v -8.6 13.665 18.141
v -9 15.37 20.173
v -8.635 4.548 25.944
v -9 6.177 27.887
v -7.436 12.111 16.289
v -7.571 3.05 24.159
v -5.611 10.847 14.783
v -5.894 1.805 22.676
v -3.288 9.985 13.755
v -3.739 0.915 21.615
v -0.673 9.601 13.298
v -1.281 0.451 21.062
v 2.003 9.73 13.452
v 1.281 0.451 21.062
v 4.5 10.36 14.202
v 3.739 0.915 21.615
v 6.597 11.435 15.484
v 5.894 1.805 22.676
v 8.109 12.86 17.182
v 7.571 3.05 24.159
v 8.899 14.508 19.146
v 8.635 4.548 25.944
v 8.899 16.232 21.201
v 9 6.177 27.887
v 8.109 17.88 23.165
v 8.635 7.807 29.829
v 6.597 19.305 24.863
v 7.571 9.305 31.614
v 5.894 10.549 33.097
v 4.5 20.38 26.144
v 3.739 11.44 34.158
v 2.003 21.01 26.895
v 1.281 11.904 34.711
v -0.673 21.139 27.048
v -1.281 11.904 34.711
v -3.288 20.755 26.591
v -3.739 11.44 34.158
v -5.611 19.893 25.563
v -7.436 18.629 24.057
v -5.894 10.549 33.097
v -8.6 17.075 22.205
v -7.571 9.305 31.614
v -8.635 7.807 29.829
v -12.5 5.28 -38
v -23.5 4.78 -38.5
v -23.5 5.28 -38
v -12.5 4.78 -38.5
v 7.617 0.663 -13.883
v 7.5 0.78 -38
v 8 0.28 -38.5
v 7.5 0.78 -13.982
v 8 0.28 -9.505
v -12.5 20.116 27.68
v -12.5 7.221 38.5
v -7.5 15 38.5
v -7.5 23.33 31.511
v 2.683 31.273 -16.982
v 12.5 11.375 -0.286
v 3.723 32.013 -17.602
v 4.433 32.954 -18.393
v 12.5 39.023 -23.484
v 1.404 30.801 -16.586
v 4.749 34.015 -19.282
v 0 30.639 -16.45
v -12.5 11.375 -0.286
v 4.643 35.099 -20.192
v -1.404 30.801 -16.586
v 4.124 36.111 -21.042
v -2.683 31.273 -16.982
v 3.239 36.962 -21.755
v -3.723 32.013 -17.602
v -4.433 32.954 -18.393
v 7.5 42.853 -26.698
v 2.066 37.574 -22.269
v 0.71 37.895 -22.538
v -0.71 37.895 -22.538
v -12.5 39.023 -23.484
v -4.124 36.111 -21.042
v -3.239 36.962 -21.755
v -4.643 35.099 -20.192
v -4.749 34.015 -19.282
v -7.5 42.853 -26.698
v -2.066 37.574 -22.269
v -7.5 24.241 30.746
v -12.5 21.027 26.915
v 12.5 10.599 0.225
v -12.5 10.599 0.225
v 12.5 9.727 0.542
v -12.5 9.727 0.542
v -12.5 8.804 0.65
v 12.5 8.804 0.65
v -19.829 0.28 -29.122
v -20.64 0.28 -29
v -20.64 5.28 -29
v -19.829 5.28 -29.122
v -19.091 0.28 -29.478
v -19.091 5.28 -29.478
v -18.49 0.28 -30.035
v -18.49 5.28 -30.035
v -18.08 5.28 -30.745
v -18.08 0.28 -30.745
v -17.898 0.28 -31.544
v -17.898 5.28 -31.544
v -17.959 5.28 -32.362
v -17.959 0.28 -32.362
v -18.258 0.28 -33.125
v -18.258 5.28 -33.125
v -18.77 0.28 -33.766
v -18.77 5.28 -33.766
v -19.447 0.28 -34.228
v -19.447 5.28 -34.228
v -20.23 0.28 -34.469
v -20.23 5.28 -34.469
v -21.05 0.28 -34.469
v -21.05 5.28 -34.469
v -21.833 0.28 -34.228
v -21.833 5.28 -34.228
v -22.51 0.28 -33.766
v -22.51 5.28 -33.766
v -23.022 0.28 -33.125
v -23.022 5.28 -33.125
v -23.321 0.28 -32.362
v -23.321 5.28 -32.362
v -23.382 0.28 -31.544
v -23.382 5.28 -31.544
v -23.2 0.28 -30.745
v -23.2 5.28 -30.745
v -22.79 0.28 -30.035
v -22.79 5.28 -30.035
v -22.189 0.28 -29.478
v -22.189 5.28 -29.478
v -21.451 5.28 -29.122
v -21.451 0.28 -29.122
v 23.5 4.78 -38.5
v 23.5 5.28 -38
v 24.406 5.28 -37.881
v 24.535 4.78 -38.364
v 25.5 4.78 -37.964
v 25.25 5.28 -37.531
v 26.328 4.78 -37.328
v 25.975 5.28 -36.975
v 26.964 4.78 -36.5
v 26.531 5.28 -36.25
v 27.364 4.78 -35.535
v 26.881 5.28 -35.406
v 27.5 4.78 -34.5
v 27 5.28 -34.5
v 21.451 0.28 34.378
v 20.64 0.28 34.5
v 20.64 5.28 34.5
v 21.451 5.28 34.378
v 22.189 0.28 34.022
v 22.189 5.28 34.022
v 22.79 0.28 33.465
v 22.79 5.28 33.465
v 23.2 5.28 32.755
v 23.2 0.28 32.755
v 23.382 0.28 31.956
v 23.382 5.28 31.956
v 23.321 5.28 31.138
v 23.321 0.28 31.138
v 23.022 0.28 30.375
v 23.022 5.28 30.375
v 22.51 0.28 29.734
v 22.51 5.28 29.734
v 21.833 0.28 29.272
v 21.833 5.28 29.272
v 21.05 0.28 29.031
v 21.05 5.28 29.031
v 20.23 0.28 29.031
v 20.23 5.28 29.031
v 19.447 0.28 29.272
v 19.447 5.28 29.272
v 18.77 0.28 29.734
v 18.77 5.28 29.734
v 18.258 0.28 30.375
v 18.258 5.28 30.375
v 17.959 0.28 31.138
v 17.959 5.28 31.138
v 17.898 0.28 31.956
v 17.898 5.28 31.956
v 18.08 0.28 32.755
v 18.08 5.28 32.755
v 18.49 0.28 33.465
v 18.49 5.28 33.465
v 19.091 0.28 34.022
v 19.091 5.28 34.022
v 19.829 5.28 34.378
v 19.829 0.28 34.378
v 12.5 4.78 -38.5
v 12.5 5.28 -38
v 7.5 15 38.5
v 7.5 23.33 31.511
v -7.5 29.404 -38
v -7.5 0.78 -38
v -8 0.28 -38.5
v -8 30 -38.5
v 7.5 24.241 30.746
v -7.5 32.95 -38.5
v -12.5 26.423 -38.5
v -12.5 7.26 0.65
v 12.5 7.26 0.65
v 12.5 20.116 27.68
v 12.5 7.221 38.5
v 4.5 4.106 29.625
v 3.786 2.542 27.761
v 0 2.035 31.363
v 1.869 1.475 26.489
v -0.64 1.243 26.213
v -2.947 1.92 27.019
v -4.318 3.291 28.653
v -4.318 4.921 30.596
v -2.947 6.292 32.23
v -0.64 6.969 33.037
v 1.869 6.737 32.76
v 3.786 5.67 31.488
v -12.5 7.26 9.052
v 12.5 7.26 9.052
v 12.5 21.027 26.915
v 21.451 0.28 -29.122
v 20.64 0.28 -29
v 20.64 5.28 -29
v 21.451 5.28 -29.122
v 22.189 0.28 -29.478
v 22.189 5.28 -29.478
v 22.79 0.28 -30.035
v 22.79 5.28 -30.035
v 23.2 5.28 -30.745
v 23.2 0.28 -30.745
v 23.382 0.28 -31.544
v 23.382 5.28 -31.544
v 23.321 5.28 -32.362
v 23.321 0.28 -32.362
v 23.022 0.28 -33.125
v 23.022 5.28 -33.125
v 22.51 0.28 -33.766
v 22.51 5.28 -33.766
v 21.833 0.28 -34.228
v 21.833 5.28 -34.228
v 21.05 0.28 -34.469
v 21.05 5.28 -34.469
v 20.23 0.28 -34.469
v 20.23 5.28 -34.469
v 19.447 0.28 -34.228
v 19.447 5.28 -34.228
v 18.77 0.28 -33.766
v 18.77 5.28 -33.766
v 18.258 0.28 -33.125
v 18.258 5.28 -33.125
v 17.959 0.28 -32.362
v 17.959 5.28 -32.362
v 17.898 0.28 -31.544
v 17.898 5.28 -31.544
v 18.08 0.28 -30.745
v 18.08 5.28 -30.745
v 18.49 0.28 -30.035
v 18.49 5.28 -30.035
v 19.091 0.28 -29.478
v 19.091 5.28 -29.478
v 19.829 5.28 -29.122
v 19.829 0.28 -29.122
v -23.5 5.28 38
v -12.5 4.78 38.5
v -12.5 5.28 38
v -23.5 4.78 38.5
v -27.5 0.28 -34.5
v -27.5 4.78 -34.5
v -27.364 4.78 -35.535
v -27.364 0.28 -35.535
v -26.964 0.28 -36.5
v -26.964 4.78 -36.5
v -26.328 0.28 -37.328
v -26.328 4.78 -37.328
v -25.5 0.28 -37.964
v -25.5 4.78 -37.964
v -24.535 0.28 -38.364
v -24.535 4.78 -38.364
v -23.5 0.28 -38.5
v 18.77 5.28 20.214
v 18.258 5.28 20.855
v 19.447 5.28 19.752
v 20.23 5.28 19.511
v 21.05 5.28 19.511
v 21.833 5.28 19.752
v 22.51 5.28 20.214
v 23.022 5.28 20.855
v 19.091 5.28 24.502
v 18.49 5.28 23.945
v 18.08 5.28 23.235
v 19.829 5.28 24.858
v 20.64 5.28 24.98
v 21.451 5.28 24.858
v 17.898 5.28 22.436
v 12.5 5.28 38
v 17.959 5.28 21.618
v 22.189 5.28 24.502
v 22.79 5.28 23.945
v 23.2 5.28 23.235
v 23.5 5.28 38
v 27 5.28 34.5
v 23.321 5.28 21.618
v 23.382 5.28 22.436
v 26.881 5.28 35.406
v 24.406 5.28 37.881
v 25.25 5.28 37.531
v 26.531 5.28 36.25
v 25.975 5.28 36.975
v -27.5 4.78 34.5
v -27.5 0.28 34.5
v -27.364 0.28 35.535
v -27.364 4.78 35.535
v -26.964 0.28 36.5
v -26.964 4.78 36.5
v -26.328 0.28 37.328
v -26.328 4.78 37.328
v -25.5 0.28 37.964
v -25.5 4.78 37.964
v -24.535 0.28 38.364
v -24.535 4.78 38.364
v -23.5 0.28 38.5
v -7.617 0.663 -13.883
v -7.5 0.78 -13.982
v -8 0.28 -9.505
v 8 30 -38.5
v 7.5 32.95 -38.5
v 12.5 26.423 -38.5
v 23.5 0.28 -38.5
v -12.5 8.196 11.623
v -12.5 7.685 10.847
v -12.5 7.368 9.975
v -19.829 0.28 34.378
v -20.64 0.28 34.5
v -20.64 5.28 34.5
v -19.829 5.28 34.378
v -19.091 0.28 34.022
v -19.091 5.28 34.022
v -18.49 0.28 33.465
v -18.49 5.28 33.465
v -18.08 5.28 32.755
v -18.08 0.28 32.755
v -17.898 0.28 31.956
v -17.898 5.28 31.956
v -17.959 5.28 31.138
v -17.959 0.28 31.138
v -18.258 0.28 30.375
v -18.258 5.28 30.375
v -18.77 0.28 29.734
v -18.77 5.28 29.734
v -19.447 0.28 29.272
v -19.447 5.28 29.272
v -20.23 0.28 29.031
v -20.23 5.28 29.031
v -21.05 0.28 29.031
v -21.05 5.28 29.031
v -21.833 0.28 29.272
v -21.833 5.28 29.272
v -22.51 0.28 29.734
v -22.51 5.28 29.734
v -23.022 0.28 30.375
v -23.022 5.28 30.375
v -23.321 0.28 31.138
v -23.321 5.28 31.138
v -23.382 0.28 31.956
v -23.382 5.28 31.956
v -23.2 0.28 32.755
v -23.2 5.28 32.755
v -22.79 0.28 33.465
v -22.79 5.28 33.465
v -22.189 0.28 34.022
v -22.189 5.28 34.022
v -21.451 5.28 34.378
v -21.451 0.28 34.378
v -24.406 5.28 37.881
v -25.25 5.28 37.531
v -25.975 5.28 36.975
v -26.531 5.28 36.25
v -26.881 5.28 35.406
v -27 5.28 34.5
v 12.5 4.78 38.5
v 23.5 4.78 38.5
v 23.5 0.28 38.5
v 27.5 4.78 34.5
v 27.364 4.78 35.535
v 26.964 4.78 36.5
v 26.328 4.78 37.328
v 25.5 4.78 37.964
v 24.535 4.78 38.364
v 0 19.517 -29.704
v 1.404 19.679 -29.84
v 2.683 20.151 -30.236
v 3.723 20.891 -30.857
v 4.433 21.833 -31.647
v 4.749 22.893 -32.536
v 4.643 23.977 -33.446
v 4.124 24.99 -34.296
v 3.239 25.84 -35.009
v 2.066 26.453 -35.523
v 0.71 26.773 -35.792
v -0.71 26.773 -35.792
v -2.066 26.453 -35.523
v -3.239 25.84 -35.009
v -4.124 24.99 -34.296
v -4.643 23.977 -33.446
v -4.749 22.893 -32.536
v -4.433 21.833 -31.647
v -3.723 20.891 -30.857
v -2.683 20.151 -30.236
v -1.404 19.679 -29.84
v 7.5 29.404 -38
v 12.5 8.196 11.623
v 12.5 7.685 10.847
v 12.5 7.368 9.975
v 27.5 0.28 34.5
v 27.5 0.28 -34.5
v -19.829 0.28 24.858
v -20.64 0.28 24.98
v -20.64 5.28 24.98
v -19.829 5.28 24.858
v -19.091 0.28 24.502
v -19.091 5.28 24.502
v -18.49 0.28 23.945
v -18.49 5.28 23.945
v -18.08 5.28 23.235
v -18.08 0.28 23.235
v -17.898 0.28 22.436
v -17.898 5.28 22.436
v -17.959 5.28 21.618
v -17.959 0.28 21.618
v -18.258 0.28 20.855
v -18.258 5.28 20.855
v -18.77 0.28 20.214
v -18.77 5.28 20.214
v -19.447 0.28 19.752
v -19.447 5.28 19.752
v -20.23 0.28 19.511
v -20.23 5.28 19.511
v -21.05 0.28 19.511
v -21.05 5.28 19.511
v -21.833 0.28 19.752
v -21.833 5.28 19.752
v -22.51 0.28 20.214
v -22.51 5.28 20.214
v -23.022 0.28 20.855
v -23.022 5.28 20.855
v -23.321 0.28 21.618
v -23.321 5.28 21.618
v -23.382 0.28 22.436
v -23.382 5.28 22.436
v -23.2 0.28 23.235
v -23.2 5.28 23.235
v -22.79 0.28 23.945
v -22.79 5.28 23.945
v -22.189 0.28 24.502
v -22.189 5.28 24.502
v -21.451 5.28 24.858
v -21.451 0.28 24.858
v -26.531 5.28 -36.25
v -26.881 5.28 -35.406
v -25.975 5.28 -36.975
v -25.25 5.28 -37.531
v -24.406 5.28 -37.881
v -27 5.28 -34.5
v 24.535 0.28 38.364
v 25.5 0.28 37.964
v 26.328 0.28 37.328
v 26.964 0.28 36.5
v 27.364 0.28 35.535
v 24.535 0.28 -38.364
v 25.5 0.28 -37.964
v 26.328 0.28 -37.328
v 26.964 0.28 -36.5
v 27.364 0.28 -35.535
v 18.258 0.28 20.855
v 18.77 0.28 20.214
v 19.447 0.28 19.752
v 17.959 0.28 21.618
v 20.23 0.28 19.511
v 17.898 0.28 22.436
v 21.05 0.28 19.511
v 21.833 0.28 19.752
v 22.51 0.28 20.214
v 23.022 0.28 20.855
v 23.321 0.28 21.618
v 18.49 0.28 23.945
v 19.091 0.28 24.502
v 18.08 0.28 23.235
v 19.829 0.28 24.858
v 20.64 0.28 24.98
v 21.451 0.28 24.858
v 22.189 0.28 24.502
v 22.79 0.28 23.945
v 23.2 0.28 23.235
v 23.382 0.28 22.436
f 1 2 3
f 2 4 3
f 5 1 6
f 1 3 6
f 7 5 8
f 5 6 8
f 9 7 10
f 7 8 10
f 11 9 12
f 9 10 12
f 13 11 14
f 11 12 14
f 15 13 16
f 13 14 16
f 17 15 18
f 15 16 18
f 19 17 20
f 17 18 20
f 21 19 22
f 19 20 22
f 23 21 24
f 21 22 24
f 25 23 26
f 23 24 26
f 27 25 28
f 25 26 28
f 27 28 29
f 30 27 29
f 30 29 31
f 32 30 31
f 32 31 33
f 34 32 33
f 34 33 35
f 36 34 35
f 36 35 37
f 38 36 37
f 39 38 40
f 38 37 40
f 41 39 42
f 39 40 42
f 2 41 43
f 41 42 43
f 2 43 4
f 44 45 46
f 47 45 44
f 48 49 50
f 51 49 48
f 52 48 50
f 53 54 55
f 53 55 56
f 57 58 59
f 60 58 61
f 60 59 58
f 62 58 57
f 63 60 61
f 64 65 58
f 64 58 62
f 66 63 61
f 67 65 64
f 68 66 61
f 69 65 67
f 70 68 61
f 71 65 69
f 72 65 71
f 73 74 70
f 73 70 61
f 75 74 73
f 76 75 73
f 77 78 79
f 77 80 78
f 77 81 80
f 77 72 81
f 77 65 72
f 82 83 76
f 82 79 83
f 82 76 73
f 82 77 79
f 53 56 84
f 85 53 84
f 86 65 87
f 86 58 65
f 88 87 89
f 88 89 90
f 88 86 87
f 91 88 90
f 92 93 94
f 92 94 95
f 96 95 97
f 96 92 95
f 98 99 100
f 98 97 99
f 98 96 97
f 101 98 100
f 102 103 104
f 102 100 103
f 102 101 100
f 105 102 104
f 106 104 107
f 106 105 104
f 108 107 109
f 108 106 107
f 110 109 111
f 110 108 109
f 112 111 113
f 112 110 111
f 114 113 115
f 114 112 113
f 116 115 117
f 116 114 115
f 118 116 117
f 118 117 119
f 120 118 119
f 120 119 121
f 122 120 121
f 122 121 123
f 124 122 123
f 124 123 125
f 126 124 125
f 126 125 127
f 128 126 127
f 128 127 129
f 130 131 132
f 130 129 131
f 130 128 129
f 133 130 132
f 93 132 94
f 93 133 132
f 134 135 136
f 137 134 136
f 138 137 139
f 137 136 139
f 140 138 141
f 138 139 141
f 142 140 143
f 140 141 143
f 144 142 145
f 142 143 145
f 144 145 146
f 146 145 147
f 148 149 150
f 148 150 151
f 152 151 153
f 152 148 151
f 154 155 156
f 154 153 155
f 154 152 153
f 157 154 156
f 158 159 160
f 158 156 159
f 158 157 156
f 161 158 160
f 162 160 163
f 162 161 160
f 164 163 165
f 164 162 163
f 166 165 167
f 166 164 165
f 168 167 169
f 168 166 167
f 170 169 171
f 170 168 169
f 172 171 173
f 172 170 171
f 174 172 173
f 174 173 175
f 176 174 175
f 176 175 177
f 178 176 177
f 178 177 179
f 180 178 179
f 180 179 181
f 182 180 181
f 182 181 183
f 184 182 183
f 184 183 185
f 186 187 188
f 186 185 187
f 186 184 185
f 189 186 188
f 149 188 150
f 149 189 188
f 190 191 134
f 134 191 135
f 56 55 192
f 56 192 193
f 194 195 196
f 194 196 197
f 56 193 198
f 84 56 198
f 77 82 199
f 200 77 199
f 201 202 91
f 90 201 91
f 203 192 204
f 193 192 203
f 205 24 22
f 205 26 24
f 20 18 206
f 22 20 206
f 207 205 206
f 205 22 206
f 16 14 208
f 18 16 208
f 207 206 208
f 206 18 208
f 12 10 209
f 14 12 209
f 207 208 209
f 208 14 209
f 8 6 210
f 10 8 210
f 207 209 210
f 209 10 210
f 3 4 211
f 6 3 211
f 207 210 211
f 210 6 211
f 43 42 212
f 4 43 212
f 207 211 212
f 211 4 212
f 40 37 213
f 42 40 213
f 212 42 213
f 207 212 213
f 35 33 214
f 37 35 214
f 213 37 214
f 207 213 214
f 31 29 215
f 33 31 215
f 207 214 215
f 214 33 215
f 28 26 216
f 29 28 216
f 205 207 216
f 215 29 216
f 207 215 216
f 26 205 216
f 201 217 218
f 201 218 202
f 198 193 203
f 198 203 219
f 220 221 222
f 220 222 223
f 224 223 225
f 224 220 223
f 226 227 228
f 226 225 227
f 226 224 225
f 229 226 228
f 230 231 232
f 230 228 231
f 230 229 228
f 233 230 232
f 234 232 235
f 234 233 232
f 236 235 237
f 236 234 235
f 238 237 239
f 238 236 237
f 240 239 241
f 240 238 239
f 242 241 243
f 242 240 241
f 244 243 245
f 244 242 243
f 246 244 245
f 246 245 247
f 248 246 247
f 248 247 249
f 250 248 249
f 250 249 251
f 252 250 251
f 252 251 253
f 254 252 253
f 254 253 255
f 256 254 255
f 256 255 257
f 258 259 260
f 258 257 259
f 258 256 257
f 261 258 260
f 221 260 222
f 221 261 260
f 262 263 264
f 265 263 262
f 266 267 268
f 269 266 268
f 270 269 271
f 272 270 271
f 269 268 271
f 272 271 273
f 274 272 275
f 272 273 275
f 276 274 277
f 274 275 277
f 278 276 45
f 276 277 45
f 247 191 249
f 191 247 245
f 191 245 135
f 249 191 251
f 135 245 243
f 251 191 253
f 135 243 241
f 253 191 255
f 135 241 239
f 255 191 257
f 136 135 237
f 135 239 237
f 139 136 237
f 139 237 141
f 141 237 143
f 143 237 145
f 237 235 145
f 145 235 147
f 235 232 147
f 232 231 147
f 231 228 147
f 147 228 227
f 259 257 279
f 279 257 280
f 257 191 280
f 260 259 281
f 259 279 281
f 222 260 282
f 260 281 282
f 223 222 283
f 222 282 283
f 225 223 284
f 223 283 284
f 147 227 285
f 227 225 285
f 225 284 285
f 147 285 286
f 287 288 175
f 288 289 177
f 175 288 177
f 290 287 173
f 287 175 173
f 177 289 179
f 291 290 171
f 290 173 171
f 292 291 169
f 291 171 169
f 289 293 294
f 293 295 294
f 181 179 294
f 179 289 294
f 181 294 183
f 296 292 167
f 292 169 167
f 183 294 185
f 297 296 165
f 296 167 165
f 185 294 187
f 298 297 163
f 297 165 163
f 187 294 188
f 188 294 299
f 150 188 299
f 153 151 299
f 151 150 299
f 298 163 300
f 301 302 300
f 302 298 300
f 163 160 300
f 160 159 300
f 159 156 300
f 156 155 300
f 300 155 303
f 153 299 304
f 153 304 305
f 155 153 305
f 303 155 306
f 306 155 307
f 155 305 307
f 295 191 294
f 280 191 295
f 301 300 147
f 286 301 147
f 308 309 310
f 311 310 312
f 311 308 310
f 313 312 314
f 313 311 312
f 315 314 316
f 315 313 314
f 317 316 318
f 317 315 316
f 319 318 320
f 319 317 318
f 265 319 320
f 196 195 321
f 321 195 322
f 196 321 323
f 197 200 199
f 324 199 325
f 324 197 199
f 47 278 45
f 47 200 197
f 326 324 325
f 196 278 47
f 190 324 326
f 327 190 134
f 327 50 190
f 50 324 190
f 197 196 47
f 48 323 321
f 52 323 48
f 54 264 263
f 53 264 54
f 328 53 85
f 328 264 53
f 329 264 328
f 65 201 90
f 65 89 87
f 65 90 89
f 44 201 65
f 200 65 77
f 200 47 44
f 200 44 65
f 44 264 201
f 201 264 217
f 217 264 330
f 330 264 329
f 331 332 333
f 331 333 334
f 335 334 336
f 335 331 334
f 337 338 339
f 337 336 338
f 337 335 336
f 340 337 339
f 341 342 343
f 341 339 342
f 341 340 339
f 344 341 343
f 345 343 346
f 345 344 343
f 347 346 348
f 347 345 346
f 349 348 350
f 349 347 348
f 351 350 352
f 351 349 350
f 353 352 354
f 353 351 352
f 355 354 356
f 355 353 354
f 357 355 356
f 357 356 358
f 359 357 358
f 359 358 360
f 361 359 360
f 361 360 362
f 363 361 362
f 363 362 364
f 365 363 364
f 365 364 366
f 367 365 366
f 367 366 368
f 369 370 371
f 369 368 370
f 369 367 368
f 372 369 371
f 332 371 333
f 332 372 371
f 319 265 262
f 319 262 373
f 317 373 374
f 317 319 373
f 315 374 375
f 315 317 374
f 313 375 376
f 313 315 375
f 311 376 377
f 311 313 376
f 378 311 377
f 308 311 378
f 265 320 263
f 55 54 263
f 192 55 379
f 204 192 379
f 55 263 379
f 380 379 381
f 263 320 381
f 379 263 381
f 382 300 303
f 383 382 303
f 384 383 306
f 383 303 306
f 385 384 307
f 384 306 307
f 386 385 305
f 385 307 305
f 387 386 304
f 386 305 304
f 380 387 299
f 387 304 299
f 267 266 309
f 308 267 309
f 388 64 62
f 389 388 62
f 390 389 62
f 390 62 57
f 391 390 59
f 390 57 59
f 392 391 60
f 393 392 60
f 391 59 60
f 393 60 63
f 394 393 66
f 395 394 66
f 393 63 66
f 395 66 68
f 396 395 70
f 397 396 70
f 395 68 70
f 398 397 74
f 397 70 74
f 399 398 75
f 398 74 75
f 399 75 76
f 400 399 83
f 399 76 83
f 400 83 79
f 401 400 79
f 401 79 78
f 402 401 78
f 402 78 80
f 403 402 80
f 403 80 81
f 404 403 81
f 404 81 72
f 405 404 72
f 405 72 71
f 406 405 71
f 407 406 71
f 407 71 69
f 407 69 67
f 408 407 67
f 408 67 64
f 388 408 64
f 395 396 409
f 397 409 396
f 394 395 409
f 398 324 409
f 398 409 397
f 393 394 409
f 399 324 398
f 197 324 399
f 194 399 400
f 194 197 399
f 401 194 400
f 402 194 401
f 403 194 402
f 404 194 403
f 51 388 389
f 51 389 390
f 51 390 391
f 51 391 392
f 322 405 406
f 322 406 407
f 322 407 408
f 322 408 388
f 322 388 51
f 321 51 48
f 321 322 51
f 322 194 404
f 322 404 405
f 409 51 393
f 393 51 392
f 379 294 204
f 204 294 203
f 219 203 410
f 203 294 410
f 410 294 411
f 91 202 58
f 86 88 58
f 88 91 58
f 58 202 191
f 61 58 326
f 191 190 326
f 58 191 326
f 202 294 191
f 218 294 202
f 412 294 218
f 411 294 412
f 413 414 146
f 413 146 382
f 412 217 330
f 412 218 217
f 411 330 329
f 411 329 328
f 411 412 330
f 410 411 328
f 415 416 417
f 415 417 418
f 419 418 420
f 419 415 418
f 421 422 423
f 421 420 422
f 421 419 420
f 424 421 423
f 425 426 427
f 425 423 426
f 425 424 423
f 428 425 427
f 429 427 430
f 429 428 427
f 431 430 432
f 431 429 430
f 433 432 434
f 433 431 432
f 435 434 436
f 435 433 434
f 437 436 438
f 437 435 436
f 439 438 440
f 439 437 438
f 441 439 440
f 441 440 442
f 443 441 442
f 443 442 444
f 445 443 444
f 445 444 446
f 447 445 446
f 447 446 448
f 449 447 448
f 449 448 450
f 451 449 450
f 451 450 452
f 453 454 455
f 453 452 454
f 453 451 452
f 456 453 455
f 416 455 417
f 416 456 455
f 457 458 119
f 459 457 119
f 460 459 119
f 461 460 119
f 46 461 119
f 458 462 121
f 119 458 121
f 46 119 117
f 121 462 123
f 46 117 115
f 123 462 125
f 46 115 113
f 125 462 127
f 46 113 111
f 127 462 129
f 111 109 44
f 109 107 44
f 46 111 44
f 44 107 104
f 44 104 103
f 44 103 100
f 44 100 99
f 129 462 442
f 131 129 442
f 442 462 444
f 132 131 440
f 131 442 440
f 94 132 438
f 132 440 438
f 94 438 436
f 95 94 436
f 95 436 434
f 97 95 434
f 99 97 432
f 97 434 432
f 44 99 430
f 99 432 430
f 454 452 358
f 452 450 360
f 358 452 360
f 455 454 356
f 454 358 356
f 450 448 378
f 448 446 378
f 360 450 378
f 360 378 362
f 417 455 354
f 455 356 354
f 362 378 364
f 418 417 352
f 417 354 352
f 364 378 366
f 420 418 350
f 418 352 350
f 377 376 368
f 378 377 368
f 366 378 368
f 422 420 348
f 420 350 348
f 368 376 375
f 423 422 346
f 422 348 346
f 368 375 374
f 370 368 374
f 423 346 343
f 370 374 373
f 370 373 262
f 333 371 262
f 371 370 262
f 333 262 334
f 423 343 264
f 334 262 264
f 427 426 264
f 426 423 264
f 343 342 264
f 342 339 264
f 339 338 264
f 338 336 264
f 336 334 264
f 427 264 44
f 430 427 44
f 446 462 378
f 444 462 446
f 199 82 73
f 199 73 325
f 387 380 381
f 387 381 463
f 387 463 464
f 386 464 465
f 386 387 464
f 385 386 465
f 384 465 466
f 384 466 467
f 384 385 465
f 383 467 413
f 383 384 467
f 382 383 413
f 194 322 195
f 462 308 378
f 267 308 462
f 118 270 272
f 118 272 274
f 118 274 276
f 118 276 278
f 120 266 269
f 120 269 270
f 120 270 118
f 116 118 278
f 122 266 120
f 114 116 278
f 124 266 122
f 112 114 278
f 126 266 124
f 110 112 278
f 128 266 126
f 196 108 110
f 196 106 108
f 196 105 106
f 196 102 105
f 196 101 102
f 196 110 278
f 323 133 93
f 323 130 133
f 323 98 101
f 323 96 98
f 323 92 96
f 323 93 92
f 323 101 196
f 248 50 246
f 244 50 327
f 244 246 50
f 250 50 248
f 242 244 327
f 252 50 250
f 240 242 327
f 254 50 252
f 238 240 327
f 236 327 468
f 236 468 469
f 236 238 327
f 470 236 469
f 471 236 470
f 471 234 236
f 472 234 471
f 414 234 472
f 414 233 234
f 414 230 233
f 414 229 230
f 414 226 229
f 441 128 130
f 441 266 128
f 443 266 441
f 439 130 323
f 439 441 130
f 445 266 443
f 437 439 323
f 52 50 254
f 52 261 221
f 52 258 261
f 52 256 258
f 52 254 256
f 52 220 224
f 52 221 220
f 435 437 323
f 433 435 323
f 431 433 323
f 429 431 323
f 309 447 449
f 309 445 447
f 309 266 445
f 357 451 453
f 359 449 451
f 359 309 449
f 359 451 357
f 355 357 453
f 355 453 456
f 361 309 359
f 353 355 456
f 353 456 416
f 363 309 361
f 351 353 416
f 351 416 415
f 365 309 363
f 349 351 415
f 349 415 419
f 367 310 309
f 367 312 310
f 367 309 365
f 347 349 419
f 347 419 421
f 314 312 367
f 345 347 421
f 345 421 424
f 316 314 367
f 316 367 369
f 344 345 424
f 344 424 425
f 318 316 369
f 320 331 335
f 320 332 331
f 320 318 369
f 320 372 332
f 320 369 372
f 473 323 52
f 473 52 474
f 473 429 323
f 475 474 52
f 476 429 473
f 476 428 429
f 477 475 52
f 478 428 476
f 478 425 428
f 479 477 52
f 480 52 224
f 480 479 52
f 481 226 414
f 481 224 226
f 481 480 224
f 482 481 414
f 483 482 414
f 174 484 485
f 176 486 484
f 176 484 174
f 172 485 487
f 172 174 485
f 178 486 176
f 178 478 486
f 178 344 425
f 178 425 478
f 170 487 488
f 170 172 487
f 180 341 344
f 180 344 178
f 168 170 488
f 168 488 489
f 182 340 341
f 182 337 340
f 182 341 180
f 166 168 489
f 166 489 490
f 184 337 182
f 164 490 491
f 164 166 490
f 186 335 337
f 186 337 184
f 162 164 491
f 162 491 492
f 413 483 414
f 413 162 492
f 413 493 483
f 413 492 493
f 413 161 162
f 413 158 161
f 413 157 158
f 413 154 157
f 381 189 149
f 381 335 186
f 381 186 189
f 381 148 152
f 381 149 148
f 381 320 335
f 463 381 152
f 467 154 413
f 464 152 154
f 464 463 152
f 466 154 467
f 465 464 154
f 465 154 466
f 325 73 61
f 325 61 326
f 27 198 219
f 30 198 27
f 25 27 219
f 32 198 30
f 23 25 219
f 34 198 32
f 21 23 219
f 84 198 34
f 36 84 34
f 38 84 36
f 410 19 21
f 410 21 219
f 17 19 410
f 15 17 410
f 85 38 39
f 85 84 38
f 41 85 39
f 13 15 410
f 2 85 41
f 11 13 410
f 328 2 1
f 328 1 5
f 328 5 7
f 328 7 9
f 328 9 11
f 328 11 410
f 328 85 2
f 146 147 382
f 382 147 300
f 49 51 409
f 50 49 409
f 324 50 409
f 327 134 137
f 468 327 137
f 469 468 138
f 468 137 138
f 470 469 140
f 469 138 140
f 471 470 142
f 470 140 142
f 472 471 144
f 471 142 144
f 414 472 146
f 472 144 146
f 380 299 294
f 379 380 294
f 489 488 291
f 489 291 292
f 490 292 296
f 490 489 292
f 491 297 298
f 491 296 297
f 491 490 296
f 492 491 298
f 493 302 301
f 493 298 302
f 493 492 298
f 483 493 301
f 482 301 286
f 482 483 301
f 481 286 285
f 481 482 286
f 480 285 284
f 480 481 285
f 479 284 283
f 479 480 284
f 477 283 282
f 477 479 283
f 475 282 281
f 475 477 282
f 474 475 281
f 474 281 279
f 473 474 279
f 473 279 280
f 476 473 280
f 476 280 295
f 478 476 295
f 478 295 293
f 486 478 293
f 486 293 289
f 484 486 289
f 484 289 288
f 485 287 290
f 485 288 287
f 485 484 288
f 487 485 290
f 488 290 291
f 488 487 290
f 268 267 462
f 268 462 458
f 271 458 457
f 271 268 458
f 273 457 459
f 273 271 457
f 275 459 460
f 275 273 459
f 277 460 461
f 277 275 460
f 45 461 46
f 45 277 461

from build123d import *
from OCP.BRepFilletAPI import BRepFilletAPI_MakeChamfer

# Parameters (mm, degrees)
SKETCH1_W                  = 55
SKETCH1_H                  = 77
BOSS_EXTRUDE1_DEPTH        = 45
CUT_EXTRUDE1_DEPTH         = 66.295482233
CUT_EXTRUDE1_DEPTH_BACK    = 66.295482233
SKETCH2_W                  = 15
SKETCH2_H                  = 45
CUT_EXTRUDE2_DEPTH         = 61.526853545
CUT_EXTRUDE2_DEPTH_BACK    = 61.526853545
SKETCH9_R                  = 4.7625
CUT_EXTRUDE5_DEPTH         = 60.605373357
CUT_EXTRUDE4_DEPTH         = 7.5
CUT_EXTRUDE4_DEPTH_BACK    = 7.5
CHAMFER1_SIZE              = 5
FILLET1_R                  = 4
F_12_0MM_DOWEL_HOLE2_D     = 18
F_12_0MM_DOWEL_HOLE2_DEPTH = 12
F_12_0MM_DOWEL_HOLE2_TIP   = 5.407745571
CUT_EXTRUDE6_DEPTH         = 59.947948642
CUT_EXTRUDE6_DEPTH_BACK    = 59.947948642
SKETCH16_W                 = 77
SKETCH16_H                 = 0.28
SKETCH17_W                 = 15
SKETCH17_H                 = 77
BOSS_EXTRUDE2_DEPTH        = 5
SKETCH18_R                 = 2.75
CUT_EXTRUDE8_DEPTH         = 10
FILLET2_R                  = 4
CHAMFER2_SIZE              = 0.5
CHAMFER2_SIZE2             = 4.056570221


with BuildPart() as part:
    # Sketch1 → Boss-Extrude1 (new body)
    with BuildSketch(Plane(origin=(0, 0, 0), x_dir=(1, 0, 0), z_dir=(0, 1, 0))):
        Rectangle(SKETCH1_W, SKETCH1_H)
    extrude(amount=BOSS_EXTRUDE1_DEPTH)

    # Sketch2 → Cut-Extrude1 (cut, two sides: drawn at the far end of the back side and taken through both)
    with BuildSketch(Plane.XY.offset(-CUT_EXTRUDE1_DEPTH_BACK)):
        with Locations((-20, 22.5)):
            Rectangle(SKETCH2_W, SKETCH2_H)
        with Locations((20, 22.5)):
            Rectangle(SKETCH2_W, SKETCH2_H)
    extrude(amount=CUT_EXTRUDE1_DEPTH + CUT_EXTRUDE1_DEPTH_BACK, mode=Mode.SUBTRACT)

    # Sketch3 → Cut-Extrude2 (cut, two sides: drawn at the far end of the back side and taken through both)
    with BuildSketch(Plane(origin=(0, 0, 0), x_dir=(0, 0, -1), z_dir=(1, 0, 0)).offset(-CUT_EXTRUDE2_DEPTH_BACK)):
        Polygon((-38.5, 15), (-31.51055999, 23.329690242), (-30.745642734, 24.241283129), (-10.508137558, 7.26), (-0.650260841, 7.26), (-0.650260841, 10.26), (26.698327812, 42.85277878), (38.5, 32.95), (38.5, 45), (24.14, 45), (-38.5, 45), align=None)
    extrude(amount=CUT_EXTRUDE2_DEPTH + CUT_EXTRUDE2_DEPTH_BACK, mode=Mode.SUBTRACT)

    # Sketch9 → Cut-Extrude5 (cut, through all)
    with BuildSketch(Plane(origin=(0, 4.559375807, 5.433652498), x_dir=(1, 0, 0), z_dir=(0, 0.6427876096865435, 0.7660444431189747))):
        with Locations(Location((0, 38.806982034, 0), (0, 0, 270))):
            Circle(SKETCH9_R)
    extrude(amount=-CUT_EXTRUDE5_DEPTH, mode=Mode.SUBTRACT)

    # Sketch5 → Cut-Extrude4 (cut, two sides: drawn at the far end of the back side and taken through both)
    with BuildSketch(Plane(origin=(0, 0, 0), x_dir=(0, 0, -1), z_dir=(1, 0, 0)).offset(-CUT_EXTRUDE4_DEPTH_BACK)):
        Polygon((38.5, 0), (38.5, 30), (13.327011065, 0), align=None)
    extrude(amount=CUT_EXTRUDE4_DEPTH + CUT_EXTRUDE4_DEPTH_BACK, mode=Mode.SUBTRACT)

    # Chamfer1
    chamfer1_edges = [part.edges().sort_by_distance(p)[0] for p in [
        (-12.5, 19.620641565, 34.622821367),
        (-12.5, 37.90138939, -32.599163906),
        (12.5, 19.620641565, 34.622821367),
        (12.5, 37.90138939, -32.599163906),
    ]]
    chamfer(chamfer1_edges, length=CHAMFER1_SIZE)

    # Fillet1
    fillet1_edges = [part.edges().sort_by_distance(p)[0] for p in [
        (0, 10.26, 0.650260841),
        (0, 7.26, 10.508137558),
    ]]
    fillet(fillet1_edges, radius=FILLET1_R)

    # Ø12.0mm Dowel Hole2
    with Locations(Plane(origin=(0, -0.913904784, 0.766857167), x_dir=(1, 0, 0), z_dir=(0, 0.7660444431189749, -0.6427876096865432))):
        with Locations((0, -25.333129579)):
            Hole(F_12_0MM_DOWEL_HOLE2_D / 2, depth=F_12_0MM_DOWEL_HOLE2_DEPTH)
            with Locations((0, 0, -(F_12_0MM_DOWEL_HOLE2_DEPTH + F_12_0MM_DOWEL_HOLE2_TIP / 2))):  # 118° drill point
                Cone(0, F_12_0MM_DOWEL_HOLE2_D / 2, F_12_0MM_DOWEL_HOLE2_TIP, mode=Mode.SUBTRACT)

    # Sketch16 → Cut-Extrude6 (cut, two sides: drawn at the far end of the back side and taken through both)
    with BuildSketch(Plane(origin=(0, 0, 0), x_dir=(0, 0, -1), z_dir=(1, 0, 0)).offset(-CUT_EXTRUDE6_DEPTH_BACK)):
        with Locations((0, 0.14)):
            Rectangle(SKETCH16_W, SKETCH16_H)
    extrude(amount=CUT_EXTRUDE6_DEPTH + CUT_EXTRUDE6_DEPTH_BACK, mode=Mode.SUBTRACT)

    # Sketch17 → Boss-Extrude2 (add)
    with BuildSketch(Plane.XZ.offset(-0.28)):
        with Locations((-20, 0)):
            Rectangle(SKETCH17_W, SKETCH17_H)
        with Locations((20, 0)):
            Rectangle(SKETCH17_W, SKETCH17_H)
    extrude(amount=-BOSS_EXTRUDE2_DEPTH)

    # Sketch18 → Cut-Extrude8 (cut)
    with BuildSketch(Plane(origin=(0, 0, 0), x_dir=(1, 0, 0), z_dir=(0, 1, 0))):
        with Locations(Location((-20.64, -31.75, 0), (0, 0, 270))):
            Circle(SKETCH18_R)
        with Locations(Location((-20.64, 31.75, 0), (0, 0, 270))):
            Circle(SKETCH18_R)
        with Locations(Location((-20.64, -22.23, 0), (0, 0, 270))):
            Circle(SKETCH18_R)
        with Locations(Location((20.64, -22.23, 0), (0, 0, 270))):
            Circle(SKETCH18_R)
        with Locations(Location((20.64, 31.75, 0), (0, 0, 270))):
            Circle(SKETCH18_R)
        with Locations(Location((20.64, -31.75, 0), (0, 0, 270))):
            Circle(SKETCH18_R)
    extrude(amount=CUT_EXTRUDE8_DEPTH, mode=Mode.SUBTRACT)

    # Fillet2
    fillet2_edges = [part.edges().sort_by_distance(p)[0] for p in [
        (27.5, 2.78, -38.5),
        (27.5, 2.78, 38.5),
        (-27.5, 2.78, -38.5),
        (-27.5, 2.78, 38.5),
    ]]
    fillet(fillet2_edges, radius=FILLET2_R)

    # Chamfer2: one chamfer whose edges measure the first distance from different faces: ONE call of the kernel's chamfer builder (chamfer() names one face for all edges)
    chamfer2_edges_1 = [part.edges().sort_by_distance(p)[0] for p in [
        (-7.5, 15.14, -38.5),
        (-7.5, 0.28, -26.030979481),
        (7.5, 0.28, -26.030979481),
        (7.5, 15.14, -38.5),
        (-18, 5.28, -38.5),
        (-26.328427125, 5.28, -37.328427125),
        (-27.5, 5.28, 0),
        (-26.328427125, 5.28, 37.328427125),
        (-18, 5.28, 38.5),
        (18, 5.28, -38.5),
        (26.328427125, 5.28, -37.328427125),
        (27.5, 5.28, 0),
        (26.328427125, 5.28, 37.328427125),
        (18, 5.28, 38.5),
    ]]
    chamfer2_edges_2 = [part.edges().sort_by_distance(p)[0] for p in [
        (0, 0.28, -13.561958961),
    ]]
    chamfer2_side_2 = [part.faces().sort_by_distance(p)[0] for p in [
        (0, 14.020211625, -25.091365468),
    ]]
    chamfer2 = BRepFilletAPI_MakeChamfer(part.part.solid().wrapped)
    for e in chamfer2_edges_1:
        chamfer2.Add(CHAMFER2_SIZE, e.wrapped)
    for e in chamfer2_edges_2:
        chamfer2.Add(CHAMFER2_SIZE, CHAMFER2_SIZE2, e.wrapped, chamfer2_side_2[0].wrapped)  # the first distance lies on this face
    add(Compound.cast(chamfer2.Shape()), mode=Mode.REPLACE)


solid = part.part
